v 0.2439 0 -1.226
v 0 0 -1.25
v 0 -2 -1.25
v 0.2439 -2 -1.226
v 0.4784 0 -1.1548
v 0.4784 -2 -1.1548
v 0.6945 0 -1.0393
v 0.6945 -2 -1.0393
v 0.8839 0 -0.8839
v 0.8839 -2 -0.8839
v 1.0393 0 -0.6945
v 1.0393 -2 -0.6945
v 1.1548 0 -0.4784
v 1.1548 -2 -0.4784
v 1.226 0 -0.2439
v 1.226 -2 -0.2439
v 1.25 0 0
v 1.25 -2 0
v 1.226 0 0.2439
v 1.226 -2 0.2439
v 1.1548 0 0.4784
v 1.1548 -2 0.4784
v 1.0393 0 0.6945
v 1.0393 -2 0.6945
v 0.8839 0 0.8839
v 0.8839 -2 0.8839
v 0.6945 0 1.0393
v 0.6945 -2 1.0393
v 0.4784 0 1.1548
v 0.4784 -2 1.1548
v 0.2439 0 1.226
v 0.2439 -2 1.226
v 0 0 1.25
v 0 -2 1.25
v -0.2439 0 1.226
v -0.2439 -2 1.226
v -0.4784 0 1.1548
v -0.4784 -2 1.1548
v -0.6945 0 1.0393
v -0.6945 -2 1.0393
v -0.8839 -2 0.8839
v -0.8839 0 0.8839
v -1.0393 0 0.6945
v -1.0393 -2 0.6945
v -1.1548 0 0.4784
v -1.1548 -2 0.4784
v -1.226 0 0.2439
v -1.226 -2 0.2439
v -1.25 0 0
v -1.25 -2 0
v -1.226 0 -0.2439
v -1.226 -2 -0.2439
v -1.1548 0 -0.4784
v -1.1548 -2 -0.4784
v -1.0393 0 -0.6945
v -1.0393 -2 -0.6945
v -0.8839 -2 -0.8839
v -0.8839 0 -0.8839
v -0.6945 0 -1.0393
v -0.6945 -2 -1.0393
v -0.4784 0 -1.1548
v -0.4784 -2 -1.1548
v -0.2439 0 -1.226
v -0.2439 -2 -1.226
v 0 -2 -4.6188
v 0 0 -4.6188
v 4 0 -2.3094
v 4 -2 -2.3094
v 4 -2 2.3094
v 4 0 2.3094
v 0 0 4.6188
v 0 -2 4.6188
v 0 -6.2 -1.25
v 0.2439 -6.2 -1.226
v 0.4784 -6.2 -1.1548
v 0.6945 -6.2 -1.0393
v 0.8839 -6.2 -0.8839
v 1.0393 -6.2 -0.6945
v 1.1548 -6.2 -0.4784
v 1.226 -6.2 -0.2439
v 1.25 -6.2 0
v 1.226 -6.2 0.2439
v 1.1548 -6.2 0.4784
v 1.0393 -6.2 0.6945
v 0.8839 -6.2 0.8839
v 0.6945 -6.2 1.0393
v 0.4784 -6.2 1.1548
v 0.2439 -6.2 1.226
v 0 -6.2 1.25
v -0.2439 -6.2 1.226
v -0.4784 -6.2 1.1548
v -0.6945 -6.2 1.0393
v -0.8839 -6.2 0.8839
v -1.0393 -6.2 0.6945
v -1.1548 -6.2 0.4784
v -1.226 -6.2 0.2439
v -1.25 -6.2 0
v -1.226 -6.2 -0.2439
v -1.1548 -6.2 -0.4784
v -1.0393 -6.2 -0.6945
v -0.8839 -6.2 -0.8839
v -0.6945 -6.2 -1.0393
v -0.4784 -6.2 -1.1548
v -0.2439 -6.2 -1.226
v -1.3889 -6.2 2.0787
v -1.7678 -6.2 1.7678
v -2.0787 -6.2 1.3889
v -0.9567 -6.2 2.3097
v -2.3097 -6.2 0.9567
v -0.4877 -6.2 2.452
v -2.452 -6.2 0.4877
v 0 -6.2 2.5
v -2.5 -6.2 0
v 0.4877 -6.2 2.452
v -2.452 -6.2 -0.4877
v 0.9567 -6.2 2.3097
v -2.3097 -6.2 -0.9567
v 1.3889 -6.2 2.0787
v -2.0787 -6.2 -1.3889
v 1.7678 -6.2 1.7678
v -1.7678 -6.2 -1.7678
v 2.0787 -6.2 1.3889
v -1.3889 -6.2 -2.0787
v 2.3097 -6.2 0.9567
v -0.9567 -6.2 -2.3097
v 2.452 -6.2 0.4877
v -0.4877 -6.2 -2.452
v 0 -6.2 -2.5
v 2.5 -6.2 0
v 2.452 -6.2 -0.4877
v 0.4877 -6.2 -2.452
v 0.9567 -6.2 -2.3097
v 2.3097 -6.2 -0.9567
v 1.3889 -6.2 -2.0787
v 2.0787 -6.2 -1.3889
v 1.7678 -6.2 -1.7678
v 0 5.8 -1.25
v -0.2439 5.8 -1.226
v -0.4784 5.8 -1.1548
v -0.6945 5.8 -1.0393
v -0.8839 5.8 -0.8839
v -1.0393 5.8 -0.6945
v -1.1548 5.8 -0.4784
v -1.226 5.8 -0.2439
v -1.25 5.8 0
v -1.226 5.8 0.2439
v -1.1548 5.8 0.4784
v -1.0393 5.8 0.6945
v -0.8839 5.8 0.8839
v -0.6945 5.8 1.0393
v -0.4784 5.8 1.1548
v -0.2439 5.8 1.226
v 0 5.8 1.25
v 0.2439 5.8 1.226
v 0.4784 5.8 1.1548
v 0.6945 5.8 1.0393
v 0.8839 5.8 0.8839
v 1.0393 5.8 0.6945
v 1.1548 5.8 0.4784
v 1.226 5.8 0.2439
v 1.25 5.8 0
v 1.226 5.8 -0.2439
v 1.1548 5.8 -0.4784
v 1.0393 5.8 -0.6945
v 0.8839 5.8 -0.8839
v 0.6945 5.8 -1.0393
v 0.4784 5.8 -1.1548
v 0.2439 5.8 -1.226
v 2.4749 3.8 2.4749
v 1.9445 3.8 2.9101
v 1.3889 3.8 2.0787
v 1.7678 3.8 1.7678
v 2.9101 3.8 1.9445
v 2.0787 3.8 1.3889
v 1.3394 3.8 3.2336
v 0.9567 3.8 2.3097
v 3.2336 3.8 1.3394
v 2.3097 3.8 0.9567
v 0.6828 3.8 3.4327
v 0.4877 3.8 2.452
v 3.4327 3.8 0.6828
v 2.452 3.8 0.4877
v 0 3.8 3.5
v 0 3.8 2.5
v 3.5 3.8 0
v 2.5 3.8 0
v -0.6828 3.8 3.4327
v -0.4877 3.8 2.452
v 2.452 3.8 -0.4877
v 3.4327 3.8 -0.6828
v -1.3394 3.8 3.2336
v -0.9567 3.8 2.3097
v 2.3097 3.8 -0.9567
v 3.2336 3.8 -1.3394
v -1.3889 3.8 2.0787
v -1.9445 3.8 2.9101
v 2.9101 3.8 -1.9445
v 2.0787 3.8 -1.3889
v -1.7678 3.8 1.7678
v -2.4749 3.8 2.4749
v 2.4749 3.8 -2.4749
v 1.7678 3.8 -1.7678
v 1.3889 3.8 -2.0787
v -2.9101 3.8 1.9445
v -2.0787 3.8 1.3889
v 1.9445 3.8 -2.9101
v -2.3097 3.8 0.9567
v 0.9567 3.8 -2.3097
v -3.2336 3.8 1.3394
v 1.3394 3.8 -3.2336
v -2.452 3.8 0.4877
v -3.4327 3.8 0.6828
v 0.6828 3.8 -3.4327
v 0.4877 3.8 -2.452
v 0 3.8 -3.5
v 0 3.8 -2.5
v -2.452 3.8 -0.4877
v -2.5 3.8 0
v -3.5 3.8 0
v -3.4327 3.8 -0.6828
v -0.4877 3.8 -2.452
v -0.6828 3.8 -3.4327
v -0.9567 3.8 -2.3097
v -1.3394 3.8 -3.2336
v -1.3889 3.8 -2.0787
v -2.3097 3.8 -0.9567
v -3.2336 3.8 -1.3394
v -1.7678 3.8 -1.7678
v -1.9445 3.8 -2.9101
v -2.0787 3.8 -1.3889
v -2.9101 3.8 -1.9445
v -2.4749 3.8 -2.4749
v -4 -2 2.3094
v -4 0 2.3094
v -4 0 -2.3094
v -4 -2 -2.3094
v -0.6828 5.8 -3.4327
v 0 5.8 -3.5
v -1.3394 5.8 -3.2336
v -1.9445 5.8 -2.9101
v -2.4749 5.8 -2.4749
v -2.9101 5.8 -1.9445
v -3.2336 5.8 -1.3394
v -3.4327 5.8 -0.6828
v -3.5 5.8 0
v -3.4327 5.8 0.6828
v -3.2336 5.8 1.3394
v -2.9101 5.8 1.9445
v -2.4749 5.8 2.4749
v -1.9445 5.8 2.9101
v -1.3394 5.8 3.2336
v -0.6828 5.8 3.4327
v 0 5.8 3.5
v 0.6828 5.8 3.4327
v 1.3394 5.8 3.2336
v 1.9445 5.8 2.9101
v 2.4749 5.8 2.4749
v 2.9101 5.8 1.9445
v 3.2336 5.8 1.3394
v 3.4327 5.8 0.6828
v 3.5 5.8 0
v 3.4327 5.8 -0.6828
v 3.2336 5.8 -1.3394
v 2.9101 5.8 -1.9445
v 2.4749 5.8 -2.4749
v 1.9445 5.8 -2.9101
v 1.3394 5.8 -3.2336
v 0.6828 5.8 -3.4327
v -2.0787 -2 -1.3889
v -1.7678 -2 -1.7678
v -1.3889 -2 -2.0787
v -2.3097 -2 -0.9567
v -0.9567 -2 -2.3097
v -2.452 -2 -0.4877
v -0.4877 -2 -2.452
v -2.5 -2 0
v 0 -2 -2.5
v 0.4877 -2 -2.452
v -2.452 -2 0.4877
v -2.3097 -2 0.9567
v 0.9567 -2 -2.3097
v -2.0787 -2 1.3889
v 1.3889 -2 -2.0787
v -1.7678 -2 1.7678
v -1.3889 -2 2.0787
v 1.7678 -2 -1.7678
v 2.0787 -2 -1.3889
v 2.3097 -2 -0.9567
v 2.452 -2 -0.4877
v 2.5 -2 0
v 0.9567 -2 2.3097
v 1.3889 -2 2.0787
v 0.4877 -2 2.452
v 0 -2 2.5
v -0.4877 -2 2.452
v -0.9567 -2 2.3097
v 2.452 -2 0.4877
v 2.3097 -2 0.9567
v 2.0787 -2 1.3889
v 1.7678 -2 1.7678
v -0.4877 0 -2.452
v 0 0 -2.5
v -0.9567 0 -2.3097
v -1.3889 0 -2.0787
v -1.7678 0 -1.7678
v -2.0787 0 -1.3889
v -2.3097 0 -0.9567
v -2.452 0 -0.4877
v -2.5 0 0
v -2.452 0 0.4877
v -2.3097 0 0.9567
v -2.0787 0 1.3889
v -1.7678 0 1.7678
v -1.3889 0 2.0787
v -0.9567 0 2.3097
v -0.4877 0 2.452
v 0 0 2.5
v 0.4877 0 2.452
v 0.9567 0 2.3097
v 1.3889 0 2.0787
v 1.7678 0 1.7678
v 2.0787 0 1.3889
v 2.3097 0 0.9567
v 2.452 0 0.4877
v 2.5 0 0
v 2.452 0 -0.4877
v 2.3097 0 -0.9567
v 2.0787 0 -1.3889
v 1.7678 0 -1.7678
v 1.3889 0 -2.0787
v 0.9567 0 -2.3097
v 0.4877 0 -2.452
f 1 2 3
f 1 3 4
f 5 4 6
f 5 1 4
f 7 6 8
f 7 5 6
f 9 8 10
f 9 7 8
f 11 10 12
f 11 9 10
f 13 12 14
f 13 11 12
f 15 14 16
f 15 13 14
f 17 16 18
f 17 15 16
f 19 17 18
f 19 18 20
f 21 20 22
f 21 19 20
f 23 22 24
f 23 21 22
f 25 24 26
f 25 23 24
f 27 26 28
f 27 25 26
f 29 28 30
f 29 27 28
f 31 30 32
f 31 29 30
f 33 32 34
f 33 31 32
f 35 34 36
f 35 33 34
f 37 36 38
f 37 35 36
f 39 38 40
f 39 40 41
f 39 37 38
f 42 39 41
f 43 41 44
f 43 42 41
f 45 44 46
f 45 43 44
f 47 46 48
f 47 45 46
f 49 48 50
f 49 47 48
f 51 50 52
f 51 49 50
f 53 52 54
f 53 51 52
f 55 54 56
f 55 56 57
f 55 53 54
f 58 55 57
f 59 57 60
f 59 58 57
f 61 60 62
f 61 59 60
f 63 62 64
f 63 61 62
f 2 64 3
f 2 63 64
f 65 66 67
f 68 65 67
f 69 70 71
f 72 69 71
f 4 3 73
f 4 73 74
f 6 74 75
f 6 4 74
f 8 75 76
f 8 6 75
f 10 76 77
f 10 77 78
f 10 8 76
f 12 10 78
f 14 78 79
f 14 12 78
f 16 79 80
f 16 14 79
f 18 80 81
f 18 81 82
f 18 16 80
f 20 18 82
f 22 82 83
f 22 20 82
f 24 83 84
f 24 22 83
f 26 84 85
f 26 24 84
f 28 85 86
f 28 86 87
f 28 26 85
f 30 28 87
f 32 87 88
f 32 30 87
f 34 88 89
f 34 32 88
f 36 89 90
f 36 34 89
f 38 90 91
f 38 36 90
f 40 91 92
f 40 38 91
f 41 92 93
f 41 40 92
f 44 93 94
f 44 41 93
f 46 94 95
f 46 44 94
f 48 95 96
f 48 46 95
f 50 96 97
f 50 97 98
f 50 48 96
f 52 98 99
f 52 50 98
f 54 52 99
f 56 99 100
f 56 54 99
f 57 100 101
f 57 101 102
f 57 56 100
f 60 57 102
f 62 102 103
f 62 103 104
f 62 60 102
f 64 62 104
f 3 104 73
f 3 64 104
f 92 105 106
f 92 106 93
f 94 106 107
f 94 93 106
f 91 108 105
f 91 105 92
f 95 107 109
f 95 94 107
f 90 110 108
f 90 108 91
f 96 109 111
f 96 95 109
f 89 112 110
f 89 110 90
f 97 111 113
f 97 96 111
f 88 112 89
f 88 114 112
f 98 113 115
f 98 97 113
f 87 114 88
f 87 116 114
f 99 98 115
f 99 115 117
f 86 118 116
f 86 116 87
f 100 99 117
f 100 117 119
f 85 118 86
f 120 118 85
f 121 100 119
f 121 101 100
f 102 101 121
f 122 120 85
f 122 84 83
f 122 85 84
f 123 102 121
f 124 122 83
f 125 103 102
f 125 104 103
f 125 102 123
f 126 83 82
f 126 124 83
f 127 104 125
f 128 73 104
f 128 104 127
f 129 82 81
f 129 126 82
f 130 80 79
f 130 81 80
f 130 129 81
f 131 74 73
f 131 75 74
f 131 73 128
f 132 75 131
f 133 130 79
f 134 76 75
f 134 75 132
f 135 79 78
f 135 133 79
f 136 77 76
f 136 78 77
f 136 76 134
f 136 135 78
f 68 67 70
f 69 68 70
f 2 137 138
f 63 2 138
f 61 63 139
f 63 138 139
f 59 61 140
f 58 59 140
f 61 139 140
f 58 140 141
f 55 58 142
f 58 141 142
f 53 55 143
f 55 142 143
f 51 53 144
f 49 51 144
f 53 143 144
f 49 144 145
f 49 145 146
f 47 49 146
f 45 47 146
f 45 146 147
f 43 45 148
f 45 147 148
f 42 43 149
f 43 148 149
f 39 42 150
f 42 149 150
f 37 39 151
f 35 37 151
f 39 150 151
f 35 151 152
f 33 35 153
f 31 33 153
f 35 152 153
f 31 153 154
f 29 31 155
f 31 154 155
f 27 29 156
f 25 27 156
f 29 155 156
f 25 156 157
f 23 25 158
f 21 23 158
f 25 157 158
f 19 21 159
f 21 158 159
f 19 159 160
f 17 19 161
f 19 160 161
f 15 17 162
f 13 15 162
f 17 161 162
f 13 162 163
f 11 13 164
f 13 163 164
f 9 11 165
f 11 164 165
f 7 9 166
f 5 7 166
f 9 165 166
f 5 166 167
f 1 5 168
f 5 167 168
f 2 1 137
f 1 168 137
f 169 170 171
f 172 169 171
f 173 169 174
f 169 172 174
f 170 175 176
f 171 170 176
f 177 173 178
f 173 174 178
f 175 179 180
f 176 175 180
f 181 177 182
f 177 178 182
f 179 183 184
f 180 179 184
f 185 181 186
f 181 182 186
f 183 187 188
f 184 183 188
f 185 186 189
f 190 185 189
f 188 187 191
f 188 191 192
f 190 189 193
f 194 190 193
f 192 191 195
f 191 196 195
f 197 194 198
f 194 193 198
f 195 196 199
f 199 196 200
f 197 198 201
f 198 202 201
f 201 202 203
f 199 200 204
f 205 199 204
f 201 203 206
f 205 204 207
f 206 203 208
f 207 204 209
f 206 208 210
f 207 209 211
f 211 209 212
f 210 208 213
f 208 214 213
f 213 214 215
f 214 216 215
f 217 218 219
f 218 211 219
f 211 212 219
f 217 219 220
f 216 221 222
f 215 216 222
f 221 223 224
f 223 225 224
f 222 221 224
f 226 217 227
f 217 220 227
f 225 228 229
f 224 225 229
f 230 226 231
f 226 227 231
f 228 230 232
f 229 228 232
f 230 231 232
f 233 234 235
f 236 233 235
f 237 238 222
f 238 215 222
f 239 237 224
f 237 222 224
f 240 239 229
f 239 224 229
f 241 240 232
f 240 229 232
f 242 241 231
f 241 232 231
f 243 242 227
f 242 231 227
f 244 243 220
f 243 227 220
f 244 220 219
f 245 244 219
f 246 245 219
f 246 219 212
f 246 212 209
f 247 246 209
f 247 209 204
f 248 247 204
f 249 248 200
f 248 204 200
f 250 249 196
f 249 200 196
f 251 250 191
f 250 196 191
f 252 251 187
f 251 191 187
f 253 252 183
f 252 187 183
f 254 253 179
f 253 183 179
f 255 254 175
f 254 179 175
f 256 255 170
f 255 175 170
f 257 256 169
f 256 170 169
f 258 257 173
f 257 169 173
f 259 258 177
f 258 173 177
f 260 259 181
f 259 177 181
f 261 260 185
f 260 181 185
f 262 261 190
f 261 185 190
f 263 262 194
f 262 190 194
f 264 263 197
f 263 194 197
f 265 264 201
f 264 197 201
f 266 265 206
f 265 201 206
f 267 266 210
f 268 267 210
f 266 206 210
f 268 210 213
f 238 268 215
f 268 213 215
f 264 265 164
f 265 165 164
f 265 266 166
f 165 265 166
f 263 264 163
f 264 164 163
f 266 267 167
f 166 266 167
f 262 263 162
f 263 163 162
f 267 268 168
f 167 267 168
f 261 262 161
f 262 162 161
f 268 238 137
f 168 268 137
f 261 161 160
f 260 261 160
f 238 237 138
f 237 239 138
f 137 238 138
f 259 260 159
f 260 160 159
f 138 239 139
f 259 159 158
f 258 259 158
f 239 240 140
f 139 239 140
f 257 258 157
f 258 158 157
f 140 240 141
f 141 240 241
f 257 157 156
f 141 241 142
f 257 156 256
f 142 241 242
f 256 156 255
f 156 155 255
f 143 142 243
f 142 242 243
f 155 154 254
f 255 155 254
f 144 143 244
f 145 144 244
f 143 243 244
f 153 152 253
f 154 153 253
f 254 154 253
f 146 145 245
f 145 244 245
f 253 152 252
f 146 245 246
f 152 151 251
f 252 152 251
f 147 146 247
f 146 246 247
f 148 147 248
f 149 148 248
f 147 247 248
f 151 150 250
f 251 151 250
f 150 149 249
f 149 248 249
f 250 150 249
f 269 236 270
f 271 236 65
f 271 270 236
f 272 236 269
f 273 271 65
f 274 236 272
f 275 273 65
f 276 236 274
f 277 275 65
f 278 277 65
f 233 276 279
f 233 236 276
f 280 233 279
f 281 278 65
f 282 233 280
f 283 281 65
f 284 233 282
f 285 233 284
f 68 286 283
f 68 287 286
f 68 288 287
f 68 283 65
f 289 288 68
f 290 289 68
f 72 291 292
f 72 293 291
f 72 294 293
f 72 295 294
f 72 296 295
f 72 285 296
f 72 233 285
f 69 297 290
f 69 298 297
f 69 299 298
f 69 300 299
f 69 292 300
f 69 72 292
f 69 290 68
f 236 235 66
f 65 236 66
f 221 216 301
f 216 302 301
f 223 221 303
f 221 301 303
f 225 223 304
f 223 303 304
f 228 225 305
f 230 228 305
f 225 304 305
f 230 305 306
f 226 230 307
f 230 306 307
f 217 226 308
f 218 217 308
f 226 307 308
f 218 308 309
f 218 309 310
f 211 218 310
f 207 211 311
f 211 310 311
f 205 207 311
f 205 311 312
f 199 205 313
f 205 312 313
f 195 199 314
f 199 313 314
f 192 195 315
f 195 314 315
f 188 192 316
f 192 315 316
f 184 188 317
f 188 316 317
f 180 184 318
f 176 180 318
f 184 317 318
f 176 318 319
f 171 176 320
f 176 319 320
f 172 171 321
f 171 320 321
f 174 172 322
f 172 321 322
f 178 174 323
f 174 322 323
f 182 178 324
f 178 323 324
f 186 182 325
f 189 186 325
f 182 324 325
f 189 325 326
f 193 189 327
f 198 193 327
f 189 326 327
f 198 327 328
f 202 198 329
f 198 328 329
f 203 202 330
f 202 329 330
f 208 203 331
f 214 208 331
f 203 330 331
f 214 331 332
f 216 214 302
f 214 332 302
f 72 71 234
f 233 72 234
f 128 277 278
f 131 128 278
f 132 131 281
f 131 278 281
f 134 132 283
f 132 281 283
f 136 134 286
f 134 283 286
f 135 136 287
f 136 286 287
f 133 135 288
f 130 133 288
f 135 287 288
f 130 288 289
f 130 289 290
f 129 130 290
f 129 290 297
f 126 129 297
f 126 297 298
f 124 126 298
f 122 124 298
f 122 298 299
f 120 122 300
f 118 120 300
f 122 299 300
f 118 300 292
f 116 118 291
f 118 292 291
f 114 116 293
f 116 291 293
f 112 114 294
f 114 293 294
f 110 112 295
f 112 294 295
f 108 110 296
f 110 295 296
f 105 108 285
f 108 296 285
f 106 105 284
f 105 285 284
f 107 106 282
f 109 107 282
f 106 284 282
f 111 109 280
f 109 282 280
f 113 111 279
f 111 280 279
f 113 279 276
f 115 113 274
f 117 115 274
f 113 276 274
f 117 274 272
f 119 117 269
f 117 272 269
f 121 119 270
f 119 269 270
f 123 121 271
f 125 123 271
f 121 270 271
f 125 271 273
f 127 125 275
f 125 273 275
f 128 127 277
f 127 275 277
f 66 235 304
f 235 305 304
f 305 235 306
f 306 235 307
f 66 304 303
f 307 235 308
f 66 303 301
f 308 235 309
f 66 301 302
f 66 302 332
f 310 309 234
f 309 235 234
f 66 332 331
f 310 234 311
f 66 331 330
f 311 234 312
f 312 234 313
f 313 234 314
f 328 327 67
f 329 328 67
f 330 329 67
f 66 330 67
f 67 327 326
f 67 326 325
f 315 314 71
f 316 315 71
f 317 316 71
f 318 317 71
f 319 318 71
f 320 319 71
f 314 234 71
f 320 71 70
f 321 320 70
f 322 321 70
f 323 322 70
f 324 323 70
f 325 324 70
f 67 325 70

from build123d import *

# Parameters (mm, degrees)
ESQUISSE2_R        = 1.25
BOSS_EXTRU_1_DEPTH = 2
ESQUISSE3_R        = 2.5
ESQUISSE3_R_2      = 1.25
BOSS_EXTRU_2_DEPTH = 4.2


with BuildPart() as part:
    # Esquisse1 → Révolution1 (revolve)
    with BuildSketch(Plane.XY, mode=Mode.PRIVATE) as r_volution1_sk:
        Polygon((1.25, 0), (1.25, 5.8), (3.5, 5.8), (3.5, 3.8), (2.5, 3.8), (2.5, 0), align=None)
    revolve(r_volution1_sk.sketch.rotate(Axis((0, 0, 0), (0, 1, 0)), 90), axis=Axis((0, 0, 0), (0, 1, 0)))

    # Esquisse2 → Boss.-Extru.1 (add)
    with BuildSketch(Plane.XZ):
        Polygon((4, 2.309401077), (0, 4.618802154), (-4, 2.309401077), (-4, -2.309401077), (0, -4.618802154), (4, -2.309401077), align=None)
        with Locations(Location((0, 0, 0), (0, 0, 270))):
            Circle(ESQUISSE2_R, mode=Mode.SUBTRACT)
    extrude(amount=BOSS_EXTRU_1_DEPTH)

    # Esquisse3 → Boss.-Extru.2 (add)
    with BuildSketch(Plane.XZ.offset(2)):
        with Locations(Location((0, 0, 0), (0, 0, 270))):
            Circle(ESQUISSE3_R)
        with Locations(Location((0, 0, 0), (0, 0, 270))):
            Circle(ESQUISSE3_R_2, mode=Mode.SUBTRACT)
    extrude(amount=BOSS_EXTRU_2_DEPTH)


solid = part.part
